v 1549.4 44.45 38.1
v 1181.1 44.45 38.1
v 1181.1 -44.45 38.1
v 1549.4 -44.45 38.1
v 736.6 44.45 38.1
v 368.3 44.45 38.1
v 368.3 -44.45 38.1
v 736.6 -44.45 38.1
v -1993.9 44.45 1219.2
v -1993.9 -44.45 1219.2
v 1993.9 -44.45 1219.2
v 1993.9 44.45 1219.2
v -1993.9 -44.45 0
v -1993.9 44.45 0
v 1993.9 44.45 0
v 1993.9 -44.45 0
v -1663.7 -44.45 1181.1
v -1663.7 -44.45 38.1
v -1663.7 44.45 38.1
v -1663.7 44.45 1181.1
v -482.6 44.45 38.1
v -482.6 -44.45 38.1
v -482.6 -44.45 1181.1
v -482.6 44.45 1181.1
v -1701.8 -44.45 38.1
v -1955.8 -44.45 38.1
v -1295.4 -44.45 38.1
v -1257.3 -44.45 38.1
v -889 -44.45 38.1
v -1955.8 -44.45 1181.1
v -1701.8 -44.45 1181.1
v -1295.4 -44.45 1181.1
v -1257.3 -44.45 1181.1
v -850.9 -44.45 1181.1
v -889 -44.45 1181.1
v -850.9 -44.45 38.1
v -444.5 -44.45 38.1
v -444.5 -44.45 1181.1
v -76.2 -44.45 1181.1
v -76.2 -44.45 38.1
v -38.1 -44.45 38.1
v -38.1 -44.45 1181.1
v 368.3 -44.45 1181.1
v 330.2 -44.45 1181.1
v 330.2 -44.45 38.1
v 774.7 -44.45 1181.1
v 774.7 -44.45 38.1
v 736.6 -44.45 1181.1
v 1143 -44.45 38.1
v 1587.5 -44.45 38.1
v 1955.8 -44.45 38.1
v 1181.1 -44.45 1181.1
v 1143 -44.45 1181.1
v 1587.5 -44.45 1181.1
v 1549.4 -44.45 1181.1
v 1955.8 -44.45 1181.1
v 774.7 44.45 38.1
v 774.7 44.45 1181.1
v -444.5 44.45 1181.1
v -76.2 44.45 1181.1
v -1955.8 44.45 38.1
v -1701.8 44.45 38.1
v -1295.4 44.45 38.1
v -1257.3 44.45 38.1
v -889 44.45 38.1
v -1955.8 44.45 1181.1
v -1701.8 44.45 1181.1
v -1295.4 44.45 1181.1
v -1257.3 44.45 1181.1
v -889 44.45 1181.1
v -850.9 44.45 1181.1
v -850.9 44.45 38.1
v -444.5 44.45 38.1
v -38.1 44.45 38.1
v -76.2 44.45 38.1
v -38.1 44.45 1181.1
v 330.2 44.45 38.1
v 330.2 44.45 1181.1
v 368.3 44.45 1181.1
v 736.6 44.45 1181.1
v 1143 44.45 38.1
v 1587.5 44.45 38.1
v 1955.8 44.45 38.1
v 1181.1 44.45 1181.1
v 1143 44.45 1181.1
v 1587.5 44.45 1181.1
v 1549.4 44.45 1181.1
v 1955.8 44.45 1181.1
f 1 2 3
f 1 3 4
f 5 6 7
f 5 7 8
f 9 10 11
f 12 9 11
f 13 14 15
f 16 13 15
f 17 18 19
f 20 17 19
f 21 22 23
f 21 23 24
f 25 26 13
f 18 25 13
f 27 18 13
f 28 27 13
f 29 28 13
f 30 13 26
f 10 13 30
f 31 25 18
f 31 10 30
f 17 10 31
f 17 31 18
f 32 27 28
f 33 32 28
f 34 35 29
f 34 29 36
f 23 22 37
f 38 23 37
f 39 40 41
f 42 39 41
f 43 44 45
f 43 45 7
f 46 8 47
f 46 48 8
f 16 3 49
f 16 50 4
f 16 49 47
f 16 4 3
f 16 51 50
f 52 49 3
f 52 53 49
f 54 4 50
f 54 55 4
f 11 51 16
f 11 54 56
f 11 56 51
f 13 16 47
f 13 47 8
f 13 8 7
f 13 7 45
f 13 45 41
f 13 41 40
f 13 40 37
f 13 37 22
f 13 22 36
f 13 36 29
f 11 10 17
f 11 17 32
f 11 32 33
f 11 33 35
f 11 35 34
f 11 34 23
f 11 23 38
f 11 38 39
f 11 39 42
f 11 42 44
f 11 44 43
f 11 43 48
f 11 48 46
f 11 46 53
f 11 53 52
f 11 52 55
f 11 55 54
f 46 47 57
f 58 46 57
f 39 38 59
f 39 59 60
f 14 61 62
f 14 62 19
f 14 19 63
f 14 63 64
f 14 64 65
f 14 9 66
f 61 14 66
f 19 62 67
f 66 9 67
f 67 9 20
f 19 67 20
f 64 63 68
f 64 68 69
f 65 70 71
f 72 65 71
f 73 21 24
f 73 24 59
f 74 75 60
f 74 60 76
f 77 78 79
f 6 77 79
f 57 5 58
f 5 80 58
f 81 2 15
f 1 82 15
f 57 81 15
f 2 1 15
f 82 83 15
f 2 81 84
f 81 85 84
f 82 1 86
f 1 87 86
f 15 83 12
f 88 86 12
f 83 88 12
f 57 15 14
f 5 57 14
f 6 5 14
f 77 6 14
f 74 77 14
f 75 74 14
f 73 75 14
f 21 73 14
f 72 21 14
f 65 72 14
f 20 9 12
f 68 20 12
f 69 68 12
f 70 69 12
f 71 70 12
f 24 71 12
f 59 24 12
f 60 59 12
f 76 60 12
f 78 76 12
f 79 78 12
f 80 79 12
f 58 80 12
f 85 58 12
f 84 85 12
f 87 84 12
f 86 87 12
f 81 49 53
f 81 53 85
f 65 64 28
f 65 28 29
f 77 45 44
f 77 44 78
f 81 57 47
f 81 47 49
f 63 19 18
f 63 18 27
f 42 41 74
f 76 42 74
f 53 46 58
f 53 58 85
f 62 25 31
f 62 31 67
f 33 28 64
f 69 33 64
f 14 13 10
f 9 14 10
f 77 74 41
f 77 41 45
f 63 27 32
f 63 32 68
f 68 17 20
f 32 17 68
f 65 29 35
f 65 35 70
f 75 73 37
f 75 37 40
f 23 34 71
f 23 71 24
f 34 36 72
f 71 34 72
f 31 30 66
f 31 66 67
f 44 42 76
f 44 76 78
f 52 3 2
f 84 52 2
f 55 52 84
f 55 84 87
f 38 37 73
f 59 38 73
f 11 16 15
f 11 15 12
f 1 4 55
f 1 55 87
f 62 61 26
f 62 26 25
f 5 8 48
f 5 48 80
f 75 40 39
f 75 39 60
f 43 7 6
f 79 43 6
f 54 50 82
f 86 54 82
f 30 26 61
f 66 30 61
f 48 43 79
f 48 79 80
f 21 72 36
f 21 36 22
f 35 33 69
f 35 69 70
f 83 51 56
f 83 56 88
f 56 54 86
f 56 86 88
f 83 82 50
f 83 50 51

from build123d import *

# Parameters (mm, degrees)
F0_W     = 3987.8
F0_H     = 88.9
F1_DEPTH = 38.1
F2_W     = 38.1
F2_H     = 88.9
F3_DEPTH = 1143
F4_W     = 3987.8
F4_H     = 38.1
F5_DEPTH = 88.9


with BuildPart() as f1:
    # F0 (on Top) → F1 (new body)
    with BuildSketch(Plane.XY):
        Rectangle(F0_W, F0_H)
    extrude(amount=F1_DEPTH)

    # F2 (on face) → F3 (join)
    with BuildSketch(Plane.XY.offset(38.1)):
        with Locations((1974.85, 0)):
            Rectangle(F2_W, F2_H)
        with Locations((1568.45, 0)):
            Rectangle(F2_W, F2_H)
        with Locations((1162.05, 0)):
            Rectangle(F2_W, F2_H)
        with Locations((755.65, 0)):
            Rectangle(F2_W, F2_H)
        with Locations((349.25, 0)):
            Rectangle(F2_W, F2_H)
        with Locations((-57.15, 0)):
            Rectangle(F2_W, F2_H)
        with Locations((-463.55, 0)):
            Rectangle(F2_W, F2_H)
        with Locations((-869.95, 0)):
            Rectangle(F2_W, F2_H)
        with Locations((-1276.35, 0)):
            Rectangle(F2_W, F2_H)
        with Locations((-1974.85, 0)):
            Rectangle(F2_W, F2_H)
        with Locations((-1682.75, 0)):
            Rectangle(F2_W, F2_H)
    extrude(amount=F3_DEPTH)

    # F4 (on face) → F5 (join)
    with BuildSketch(Plane.XZ.offset(44.45)):
        with Locations((0, 1200.15)):
            Rectangle(F4_W, F4_H)
    extrude(amount=-F5_DEPTH)


solid = f1.part
